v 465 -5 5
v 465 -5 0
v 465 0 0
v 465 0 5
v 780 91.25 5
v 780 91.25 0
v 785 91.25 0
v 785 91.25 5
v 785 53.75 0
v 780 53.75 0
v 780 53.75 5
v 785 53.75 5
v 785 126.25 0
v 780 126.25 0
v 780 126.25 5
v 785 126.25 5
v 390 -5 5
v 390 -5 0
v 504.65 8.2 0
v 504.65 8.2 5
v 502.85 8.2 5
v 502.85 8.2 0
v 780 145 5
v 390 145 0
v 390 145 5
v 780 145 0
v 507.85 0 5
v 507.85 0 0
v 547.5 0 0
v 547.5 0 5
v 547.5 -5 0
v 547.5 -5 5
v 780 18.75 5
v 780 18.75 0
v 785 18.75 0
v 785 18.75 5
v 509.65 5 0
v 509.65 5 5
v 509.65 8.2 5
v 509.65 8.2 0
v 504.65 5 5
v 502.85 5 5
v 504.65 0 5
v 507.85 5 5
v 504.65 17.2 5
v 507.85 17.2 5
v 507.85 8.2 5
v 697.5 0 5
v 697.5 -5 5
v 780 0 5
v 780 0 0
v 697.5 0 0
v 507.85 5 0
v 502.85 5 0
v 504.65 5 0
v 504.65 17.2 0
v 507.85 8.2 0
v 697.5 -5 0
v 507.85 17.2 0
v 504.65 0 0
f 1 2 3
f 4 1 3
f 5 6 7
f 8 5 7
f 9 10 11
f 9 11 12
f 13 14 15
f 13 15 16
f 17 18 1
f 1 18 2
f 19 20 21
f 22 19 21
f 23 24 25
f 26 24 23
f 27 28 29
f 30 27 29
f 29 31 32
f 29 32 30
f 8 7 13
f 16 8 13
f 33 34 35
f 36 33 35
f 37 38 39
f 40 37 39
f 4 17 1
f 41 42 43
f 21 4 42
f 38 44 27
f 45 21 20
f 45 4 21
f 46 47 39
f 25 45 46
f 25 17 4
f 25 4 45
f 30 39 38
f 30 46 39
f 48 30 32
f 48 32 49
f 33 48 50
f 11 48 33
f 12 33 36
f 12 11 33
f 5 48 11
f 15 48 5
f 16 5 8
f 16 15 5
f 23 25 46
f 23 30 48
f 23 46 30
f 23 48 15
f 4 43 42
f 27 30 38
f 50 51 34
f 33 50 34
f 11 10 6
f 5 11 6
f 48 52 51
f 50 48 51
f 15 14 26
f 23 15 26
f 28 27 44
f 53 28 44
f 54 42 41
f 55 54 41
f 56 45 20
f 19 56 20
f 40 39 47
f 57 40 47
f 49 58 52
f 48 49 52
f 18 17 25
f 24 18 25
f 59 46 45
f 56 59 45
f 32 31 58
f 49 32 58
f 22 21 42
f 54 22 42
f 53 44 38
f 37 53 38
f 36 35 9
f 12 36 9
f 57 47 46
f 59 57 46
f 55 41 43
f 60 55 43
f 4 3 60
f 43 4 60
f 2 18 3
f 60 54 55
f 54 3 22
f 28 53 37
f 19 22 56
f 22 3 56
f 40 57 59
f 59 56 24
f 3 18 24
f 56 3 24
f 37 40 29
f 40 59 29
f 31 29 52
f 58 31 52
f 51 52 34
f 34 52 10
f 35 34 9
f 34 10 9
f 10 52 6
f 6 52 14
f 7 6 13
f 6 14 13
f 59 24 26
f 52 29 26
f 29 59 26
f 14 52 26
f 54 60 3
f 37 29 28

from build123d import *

# Parameters (mm, degrees)
CROQUIS1_W              = 780
CROQUIS1_H              = 145
CROQUIS1_W_2            = 150
CROQUIS1_H_2            = 5
CROQUIS1_W_3            = 5
CROQUIS1_H_3            = 35
SALIENTE_EXTRUIR1_DEPTH = 5
CORTAR_EXTRUIR1_DEPTH   = 10
CORTAR_EXTRUIR2_DEPTH   = 10


with BuildPart() as part:
    # Croquis1 → Saliente-Extruir1 (new body)
    with BuildSketch(Plane.XY):
        with Locations((390, 72.5)):
            Rectangle(CROQUIS1_W, CROQUIS1_H)
        with Locations((622.5, -2.5)):
            Rectangle(CROQUIS1_W_2, CROQUIS1_H_2)
        Polygon((390, 0), (315, 0), (315, -5), (465, -5), (465, 0), align=None)
        with Locations((157.5, -2.5)):
            Rectangle(CROQUIS1_W_2, CROQUIS1_H_2)
        with Locations((-2.5, 36.25)):
            Rectangle(CROQUIS1_W_3, CROQUIS1_H_3)
        with Locations((782.5, 36.25)):
            Rectangle(CROQUIS1_W_3, CROQUIS1_H_3)
        with Locations((782.5, 108.75)):
            Rectangle(CROQUIS1_W_3, CROQUIS1_H_3)
        with Locations((-2.5, 108.75)):
            Rectangle(CROQUIS1_W_3, CROQUIS1_H_3)
    extrude(amount=SALIENTE_EXTRUIR1_DEPTH)

    # Croquis2 → Cortar-Extruir1 (cut)
    with BuildSketch(Plane.XY.offset(5)):
        Polygon((275.35, 0), (272.15, 0), (272.15, 5), (270.35, 5), (270.35, 8.2), (272.15, 8.2), (272.15, 17.2), (275.35, 17.2), (275.35, 8.2), (277.15, 8.2), (277.15, 5), (275.35, 5), align=None)
        Polygon((507.85, 8.2), (507.85, 17.2), (504.65, 17.2), (504.65, 8.2), (502.85, 8.2), (502.85, 5), (504.65, 5), (504.65, 0), (507.85, 0), (507.85, 5), (509.65, 5), (509.65, 8.2), align=None)
    extrude(amount=-CORTAR_EXTRUIR1_DEPTH, mode=Mode.SUBTRACT)

    # Croquis3 → Cortar-Extruir2 (cut)
    with BuildSketch(Plane.XY.offset(5)):
        Polygon((390, -5), (390, 196.910235404), (-39.994271309, 207.613084807), (-47.647656294, -99.866874564), (0, -99.866874564), align=None)
    extrude(amount=-CORTAR_EXTRUIR2_DEPTH, mode=Mode.SUBTRACT)


solid = part.part
